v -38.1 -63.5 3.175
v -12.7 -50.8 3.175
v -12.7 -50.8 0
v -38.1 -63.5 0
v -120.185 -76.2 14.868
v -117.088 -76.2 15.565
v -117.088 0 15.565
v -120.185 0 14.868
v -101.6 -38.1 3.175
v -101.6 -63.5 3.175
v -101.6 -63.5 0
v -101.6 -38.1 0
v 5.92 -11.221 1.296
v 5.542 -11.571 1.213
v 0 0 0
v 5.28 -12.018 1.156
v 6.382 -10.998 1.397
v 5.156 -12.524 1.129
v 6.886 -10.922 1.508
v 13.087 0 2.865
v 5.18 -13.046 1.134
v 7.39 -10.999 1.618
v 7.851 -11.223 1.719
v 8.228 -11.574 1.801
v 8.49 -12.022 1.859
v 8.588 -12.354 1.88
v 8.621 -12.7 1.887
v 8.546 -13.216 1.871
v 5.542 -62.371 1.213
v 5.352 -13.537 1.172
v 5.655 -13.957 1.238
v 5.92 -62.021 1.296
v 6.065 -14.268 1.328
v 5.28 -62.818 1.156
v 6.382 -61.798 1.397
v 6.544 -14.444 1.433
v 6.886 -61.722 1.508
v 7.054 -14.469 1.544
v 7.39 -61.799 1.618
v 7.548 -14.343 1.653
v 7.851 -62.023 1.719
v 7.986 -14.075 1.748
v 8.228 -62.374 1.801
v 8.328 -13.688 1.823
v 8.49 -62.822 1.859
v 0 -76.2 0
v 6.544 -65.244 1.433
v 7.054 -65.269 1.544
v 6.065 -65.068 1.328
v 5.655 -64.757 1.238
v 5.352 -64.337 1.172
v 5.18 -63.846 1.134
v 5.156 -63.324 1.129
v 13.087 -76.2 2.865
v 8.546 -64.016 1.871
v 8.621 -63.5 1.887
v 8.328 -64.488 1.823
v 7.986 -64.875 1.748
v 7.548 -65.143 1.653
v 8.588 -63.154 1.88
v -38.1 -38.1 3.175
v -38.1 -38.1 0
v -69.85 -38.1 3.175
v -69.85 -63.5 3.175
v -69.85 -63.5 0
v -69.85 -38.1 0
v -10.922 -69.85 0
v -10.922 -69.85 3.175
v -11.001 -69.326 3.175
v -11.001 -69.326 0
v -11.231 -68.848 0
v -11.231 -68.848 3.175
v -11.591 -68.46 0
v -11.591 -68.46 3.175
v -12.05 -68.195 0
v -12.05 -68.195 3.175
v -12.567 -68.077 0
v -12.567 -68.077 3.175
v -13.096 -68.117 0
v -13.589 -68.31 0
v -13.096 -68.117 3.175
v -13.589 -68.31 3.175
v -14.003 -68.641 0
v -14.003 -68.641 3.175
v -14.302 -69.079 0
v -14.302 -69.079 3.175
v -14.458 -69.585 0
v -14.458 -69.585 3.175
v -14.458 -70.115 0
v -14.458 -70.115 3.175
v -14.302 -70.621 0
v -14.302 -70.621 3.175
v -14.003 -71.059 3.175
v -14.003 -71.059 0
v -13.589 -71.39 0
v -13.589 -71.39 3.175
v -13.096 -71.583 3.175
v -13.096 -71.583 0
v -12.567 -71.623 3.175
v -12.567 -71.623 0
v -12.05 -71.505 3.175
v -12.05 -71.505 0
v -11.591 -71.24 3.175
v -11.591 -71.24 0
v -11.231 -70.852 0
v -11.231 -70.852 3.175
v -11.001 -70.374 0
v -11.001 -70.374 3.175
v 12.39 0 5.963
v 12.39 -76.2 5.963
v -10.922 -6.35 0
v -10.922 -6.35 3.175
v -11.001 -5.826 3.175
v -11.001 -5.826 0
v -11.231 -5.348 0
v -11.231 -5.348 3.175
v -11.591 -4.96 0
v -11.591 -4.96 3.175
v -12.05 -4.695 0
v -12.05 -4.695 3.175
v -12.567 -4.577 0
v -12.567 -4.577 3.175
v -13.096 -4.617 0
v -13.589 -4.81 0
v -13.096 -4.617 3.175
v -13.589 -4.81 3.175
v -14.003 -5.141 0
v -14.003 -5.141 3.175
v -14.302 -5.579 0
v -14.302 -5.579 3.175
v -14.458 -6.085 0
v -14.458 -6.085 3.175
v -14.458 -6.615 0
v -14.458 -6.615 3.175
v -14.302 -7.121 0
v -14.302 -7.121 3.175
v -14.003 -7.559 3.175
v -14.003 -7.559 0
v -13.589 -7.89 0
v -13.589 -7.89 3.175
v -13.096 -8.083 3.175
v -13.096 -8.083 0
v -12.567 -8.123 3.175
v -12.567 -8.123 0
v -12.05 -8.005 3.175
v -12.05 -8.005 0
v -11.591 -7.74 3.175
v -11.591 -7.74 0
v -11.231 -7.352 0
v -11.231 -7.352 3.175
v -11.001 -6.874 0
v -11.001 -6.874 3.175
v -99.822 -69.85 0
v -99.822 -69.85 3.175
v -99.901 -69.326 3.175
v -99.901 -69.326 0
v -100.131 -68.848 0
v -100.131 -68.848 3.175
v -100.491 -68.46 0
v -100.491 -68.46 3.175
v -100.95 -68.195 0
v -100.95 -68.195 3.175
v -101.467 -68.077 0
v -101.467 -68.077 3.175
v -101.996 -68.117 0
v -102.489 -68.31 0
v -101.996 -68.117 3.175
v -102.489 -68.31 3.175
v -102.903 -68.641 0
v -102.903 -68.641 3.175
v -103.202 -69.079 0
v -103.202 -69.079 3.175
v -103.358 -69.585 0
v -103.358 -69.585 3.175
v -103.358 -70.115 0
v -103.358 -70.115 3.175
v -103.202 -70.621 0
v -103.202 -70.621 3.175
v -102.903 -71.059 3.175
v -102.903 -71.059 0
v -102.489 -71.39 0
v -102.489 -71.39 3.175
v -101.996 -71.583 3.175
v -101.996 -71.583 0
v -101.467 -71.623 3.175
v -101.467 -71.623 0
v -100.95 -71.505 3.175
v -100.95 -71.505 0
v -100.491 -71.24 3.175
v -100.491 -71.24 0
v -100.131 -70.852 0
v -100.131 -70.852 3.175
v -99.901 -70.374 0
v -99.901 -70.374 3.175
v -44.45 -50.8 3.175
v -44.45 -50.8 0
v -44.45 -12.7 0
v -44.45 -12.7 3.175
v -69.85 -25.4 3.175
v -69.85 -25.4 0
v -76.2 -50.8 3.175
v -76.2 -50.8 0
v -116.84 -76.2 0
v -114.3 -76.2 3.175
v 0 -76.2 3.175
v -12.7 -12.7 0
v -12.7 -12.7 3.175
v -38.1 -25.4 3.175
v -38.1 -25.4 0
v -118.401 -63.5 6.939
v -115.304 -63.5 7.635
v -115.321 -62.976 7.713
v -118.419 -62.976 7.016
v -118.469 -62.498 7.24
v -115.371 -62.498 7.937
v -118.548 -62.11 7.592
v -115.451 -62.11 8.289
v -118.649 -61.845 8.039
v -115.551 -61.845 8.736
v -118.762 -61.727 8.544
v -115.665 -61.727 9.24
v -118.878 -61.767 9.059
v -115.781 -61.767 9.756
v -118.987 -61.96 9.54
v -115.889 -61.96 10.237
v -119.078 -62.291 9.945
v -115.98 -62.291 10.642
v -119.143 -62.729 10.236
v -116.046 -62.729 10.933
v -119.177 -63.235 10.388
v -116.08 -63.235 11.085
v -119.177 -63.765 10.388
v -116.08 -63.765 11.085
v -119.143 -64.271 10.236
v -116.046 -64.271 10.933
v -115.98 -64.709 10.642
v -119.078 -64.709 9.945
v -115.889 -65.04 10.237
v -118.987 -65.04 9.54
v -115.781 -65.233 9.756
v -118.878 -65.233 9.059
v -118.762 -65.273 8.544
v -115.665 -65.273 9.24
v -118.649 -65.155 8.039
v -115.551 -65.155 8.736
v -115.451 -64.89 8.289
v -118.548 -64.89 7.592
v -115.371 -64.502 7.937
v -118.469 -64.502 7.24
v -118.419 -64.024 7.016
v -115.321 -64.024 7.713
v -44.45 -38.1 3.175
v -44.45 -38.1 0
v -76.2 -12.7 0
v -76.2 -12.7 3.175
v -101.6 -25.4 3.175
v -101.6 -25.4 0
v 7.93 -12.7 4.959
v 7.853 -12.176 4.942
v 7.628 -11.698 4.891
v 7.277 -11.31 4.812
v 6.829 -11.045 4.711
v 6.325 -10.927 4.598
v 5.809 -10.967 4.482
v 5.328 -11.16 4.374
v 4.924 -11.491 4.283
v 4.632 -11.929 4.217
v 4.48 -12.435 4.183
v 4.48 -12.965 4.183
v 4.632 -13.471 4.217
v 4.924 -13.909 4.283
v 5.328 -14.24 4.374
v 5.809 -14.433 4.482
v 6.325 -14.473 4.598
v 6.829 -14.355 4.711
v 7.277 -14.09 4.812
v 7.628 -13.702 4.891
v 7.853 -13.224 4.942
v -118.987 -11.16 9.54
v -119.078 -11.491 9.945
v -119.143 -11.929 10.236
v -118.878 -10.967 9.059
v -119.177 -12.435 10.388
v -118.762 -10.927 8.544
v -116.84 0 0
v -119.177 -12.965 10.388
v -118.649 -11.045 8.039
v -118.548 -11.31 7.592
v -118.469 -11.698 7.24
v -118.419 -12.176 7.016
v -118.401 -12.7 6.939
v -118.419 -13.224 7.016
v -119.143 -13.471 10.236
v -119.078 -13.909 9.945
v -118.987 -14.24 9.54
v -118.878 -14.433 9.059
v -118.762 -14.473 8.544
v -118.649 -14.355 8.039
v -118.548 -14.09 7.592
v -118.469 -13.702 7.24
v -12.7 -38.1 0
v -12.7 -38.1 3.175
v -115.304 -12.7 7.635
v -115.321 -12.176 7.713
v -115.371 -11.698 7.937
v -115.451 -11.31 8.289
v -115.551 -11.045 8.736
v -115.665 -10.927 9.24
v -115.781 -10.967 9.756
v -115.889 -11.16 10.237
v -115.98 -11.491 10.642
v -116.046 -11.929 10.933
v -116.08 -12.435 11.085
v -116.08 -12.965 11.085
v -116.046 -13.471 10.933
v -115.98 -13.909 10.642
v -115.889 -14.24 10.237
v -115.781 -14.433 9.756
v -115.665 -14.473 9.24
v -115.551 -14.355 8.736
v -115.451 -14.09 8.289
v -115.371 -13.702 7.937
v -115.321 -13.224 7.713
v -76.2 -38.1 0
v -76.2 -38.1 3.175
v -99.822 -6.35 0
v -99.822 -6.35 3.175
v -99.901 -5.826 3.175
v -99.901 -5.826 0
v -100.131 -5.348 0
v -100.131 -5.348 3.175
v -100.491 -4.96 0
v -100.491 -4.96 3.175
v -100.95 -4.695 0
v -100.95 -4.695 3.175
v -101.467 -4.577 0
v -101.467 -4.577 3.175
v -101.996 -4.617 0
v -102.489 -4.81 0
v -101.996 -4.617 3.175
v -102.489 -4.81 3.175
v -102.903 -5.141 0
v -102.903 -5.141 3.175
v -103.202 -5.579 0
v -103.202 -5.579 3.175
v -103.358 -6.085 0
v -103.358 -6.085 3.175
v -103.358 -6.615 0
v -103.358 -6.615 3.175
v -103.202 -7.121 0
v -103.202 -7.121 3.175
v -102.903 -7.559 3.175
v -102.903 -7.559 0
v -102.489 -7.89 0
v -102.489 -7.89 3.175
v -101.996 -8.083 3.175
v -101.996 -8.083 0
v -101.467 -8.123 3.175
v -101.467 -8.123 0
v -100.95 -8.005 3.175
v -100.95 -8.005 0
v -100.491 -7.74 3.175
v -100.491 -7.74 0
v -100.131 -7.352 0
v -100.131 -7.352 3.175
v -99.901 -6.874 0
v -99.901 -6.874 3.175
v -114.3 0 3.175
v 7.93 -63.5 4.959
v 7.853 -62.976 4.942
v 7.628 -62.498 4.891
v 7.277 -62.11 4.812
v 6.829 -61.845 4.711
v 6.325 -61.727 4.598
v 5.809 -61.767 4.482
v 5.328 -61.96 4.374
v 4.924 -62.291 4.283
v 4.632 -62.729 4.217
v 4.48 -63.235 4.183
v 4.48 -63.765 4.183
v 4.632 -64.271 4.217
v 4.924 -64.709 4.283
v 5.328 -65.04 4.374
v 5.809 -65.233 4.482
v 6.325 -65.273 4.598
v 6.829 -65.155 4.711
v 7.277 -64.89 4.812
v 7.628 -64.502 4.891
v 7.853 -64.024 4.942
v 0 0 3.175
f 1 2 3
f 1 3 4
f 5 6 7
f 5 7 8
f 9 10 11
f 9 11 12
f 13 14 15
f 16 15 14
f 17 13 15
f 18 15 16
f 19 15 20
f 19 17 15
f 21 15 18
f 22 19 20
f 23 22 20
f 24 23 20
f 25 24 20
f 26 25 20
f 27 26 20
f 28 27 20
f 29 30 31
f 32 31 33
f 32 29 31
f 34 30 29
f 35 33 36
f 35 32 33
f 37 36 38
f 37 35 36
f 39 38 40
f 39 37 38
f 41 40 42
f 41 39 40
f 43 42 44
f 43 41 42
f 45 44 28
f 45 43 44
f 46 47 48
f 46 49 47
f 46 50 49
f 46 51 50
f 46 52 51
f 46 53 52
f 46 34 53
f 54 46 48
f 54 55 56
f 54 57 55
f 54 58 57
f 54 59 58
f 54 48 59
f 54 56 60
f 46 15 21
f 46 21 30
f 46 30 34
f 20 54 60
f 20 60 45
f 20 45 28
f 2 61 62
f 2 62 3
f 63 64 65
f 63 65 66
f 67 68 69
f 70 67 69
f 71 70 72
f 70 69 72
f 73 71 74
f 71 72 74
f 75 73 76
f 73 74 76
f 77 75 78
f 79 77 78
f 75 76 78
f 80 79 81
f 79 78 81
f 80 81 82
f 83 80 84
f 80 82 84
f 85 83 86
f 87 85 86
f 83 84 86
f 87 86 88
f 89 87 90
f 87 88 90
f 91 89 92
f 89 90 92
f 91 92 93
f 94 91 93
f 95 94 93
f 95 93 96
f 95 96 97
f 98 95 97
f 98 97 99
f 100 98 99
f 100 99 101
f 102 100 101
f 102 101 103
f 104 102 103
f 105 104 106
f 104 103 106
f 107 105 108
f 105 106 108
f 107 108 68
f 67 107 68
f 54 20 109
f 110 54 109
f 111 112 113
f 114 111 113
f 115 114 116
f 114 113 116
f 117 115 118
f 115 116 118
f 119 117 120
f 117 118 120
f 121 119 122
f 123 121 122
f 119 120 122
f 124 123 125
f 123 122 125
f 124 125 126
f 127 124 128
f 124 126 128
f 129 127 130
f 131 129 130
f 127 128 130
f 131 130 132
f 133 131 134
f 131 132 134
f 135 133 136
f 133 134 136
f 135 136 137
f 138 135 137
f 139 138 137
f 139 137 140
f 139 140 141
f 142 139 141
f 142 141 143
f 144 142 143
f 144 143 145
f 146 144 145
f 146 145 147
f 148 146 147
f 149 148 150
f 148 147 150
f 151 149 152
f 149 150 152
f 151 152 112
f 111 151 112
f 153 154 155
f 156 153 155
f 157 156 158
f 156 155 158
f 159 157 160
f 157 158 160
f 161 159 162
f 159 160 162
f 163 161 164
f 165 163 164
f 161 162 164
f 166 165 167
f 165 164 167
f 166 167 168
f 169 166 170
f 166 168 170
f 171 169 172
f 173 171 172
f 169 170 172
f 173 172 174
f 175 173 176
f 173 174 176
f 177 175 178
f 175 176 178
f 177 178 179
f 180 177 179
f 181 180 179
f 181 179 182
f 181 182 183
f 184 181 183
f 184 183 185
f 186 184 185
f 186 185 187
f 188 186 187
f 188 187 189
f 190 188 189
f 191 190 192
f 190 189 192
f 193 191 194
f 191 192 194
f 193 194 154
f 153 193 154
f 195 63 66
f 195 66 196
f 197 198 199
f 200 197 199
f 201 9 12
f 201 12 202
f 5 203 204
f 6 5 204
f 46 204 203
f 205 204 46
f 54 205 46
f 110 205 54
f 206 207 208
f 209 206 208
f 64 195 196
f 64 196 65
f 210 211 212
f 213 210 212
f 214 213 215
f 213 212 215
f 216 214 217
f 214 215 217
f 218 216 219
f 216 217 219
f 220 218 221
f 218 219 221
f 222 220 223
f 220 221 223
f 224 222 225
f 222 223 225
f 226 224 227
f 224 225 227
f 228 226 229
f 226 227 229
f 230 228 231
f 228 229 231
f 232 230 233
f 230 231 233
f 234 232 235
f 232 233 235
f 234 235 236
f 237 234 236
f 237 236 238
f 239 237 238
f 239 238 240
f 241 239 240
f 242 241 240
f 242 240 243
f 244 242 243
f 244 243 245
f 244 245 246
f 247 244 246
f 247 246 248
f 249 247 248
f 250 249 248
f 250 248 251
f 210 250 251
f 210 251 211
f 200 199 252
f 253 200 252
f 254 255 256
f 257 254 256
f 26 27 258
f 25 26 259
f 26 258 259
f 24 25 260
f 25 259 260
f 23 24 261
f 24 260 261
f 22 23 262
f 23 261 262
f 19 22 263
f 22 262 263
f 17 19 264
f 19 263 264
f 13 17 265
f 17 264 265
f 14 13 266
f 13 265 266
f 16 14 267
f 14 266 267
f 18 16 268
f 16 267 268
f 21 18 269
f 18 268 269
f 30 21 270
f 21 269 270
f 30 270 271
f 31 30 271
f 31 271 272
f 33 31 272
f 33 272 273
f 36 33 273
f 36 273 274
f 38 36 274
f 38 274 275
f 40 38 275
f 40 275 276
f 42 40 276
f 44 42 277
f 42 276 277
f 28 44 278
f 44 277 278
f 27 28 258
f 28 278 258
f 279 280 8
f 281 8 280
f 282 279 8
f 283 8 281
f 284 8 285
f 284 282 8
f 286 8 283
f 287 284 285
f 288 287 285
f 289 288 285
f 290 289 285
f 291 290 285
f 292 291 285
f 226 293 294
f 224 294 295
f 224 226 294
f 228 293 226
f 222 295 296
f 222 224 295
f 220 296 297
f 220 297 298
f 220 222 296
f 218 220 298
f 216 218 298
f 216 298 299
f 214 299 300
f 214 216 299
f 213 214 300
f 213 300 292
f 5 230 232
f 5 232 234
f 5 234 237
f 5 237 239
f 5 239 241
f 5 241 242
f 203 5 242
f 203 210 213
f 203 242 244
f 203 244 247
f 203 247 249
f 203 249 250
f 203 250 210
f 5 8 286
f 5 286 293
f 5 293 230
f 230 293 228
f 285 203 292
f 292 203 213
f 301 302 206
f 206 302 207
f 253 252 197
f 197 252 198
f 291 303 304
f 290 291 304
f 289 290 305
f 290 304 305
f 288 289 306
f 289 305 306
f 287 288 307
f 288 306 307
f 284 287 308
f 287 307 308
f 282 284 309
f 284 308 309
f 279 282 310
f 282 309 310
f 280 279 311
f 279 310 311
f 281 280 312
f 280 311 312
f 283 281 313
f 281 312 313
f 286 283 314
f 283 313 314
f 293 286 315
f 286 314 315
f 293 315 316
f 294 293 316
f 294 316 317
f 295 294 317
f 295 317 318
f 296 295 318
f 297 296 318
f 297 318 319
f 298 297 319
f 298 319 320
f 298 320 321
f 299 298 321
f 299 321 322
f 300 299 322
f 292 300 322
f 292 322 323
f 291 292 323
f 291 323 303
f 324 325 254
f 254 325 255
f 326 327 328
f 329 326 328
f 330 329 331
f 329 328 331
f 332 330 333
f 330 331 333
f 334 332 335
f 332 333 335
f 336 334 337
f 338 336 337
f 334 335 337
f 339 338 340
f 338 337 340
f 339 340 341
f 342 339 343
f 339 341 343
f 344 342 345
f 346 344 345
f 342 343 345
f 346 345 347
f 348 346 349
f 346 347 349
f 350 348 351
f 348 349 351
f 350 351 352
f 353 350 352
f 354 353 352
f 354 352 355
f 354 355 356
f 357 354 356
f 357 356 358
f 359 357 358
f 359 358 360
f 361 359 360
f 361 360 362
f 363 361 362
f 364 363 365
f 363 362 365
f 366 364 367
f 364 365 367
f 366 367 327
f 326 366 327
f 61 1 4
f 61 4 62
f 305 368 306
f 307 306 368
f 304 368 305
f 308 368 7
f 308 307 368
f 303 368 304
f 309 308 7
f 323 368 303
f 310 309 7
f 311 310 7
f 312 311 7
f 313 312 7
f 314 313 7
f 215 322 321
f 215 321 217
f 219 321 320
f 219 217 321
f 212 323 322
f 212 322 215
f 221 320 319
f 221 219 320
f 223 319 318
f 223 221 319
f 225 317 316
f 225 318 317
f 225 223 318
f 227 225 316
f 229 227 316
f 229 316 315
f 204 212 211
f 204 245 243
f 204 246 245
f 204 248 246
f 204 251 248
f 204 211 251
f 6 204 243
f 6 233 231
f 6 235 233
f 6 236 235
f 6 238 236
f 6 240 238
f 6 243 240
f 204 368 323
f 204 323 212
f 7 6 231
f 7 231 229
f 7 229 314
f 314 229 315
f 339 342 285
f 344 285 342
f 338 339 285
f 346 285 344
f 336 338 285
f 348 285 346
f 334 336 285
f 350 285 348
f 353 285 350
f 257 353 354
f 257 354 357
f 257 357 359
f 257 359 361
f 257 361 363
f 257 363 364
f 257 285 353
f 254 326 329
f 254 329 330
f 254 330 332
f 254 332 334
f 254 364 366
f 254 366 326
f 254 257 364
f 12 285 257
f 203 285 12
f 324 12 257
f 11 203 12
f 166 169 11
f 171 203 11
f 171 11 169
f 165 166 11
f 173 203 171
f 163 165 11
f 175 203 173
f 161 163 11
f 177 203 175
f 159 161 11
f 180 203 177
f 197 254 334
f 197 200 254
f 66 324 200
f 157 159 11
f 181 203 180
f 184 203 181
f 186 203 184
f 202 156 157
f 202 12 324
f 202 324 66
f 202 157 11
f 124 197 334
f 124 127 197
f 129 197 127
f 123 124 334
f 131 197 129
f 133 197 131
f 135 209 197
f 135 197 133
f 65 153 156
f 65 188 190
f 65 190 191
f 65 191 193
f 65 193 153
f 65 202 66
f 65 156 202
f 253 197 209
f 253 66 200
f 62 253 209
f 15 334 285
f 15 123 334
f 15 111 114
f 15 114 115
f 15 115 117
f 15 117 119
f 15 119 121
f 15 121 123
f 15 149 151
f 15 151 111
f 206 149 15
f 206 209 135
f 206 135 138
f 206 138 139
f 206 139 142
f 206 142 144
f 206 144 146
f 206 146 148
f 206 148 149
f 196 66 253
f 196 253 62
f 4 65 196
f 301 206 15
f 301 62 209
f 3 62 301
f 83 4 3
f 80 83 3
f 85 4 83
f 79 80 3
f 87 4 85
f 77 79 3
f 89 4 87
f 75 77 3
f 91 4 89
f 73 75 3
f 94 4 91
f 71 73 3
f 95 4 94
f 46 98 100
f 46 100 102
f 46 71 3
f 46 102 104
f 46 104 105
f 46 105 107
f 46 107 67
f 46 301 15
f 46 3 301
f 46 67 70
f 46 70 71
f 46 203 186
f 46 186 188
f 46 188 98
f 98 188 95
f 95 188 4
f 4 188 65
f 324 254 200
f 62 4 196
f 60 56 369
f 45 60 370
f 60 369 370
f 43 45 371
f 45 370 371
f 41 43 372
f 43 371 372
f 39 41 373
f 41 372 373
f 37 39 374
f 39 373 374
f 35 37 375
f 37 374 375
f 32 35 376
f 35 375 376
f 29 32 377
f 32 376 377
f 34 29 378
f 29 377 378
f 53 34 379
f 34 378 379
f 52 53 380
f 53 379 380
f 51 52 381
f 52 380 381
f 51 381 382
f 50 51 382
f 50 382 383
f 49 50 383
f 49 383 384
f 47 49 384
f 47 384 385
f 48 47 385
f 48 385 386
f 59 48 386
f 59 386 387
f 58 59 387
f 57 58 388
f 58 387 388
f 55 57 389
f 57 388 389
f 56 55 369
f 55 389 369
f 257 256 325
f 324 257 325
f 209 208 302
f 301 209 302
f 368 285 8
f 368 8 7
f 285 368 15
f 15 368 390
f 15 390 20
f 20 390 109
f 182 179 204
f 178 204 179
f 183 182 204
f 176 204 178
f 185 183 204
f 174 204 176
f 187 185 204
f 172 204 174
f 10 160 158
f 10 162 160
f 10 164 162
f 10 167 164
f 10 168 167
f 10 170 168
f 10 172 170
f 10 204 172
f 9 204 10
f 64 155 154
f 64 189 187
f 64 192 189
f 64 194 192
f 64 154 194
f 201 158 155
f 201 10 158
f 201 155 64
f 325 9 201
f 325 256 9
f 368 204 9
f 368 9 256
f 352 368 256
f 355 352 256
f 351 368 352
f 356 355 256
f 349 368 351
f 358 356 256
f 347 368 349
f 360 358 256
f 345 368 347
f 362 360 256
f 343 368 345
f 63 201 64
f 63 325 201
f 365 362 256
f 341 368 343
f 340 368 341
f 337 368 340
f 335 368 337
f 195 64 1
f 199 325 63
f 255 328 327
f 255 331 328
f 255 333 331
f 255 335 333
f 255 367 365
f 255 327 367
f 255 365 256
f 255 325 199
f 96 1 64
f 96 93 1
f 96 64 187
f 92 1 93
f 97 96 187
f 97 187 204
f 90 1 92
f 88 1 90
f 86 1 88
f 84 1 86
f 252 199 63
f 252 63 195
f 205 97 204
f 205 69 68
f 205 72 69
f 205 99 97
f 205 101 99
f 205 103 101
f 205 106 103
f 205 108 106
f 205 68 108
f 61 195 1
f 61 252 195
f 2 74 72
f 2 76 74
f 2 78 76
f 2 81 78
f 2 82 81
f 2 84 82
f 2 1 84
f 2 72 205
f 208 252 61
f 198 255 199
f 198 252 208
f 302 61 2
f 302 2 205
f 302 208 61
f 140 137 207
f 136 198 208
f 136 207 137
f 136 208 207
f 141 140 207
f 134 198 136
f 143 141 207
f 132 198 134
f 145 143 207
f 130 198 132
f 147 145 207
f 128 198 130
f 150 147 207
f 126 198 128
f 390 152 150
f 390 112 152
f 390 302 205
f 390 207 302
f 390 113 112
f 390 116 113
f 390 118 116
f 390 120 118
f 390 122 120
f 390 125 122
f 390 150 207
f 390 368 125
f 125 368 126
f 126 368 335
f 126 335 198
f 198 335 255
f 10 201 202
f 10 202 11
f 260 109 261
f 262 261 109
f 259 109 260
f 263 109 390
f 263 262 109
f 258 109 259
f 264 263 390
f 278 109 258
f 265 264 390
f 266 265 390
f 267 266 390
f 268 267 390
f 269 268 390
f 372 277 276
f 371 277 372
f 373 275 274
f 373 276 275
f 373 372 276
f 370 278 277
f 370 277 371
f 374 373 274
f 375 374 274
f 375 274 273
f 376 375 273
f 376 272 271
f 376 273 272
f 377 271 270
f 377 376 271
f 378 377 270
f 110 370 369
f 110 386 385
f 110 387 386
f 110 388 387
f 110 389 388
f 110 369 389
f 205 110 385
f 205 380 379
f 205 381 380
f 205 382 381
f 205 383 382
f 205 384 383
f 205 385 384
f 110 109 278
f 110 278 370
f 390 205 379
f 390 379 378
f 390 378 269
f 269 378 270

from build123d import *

# Parameters (mm, degrees)
SKETCH1_W           = 114.3
SKETCH1_H           = 76.2
BOSS_EXTRUDE1_DEPTH = 3.175
BOSS_EXTRUDE2_DEPTH = 76.2
SKETCH3_R           = 1.778
CUT_EXTRUDE1_DEPTH  = 203.2
CUT_EXTRUDE2_DEPTH  = 3.175
LPATTERN1_COUNT     = 3
LPATTERN1_PITCH     = 31.75
SKETCH5_R           = 1.778
CUT_EXTRUDE3_DEPTH  = 3.175
SKETCH6_R           = 1.778
CUT_EXTRUDE4_DEPTH  = 3.175


with BuildPart() as part:
    # Sketch1 → Boss-Extrude1 (new body)
    with BuildSketch(Plane.XY):
        with Locations((-57.15, -38.1)):
            Rectangle(SKETCH1_W, SKETCH1_H)
    extrude(amount=BOSS_EXTRUDE1_DEPTH)

    # Sketch2 → Boss-Extrude2 (add)
    with BuildSketch(Plane.XZ.offset(76.2)):
        Polygon((-114.3, 3.175), (-117.087804878, 15.565243902), (-120.185365854, 14.868292683), (-116.84, 0), (-114.3, 0), align=None)
        Polygon((0, 3.175), (0, 0), (13.087195122, 2.865243902), (12.390243902, 5.962804878), align=None)
    extrude(amount=-BOSS_EXTRUDE2_DEPTH)

    # Sketch3 → Cut-Extrude1 (cut)
    with BuildSketch(Plane(origin=(-108.112433076, 0, -24.325297442), x_dir=(0.219512195, 0, -0.975609756), z_dir=(0.975609756, 0, 0.219512195))):
        with Locations((-34.537804878, -12.7)):
            Circle(SKETCH3_R)
        with Locations((-34.537804878, -63.5)):
            Circle(SKETCH3_R)
    extrude(amount=-CUT_EXTRUDE1_DEPTH, mode=Mode.SUBTRACT)

    # Sketch4 → Cut-Extrude2 (cut)
    with BuildSketch(Plane.XY.offset(3.175)):
        Polygon((-101.6, -63.5), (-101.6, -38.1), (-76.2, -50.8), align=None)
        Polygon((-101.6, -25.4), (-76.2, -38.1), (-76.2, -12.7), align=None)
    cut_extrude2 = extrude(amount=-CUT_EXTRUDE2_DEPTH, mode=Mode.SUBTRACT)

    # LPattern1: Cut-Extrude2 ×3
    with Locations(*[(i * LPATTERN1_PITCH, 0, 0) for i in range(1, LPATTERN1_COUNT)]):
        add(cut_extrude2, mode=Mode.SUBTRACT)

    # Sketch5 → Cut-Extrude3 (cut)
    with BuildSketch(Plane.XY.offset(3.175)):
        with Locations((-101.6, -69.85)):
            Circle(SKETCH5_R)
        with Locations((-12.7, -69.85)):
            Circle(SKETCH5_R)
        with Locations((-12.7, -6.35)):
            Circle(SKETCH5_R)
        with Locations((-101.6, -6.35)):
            Circle(SKETCH5_R)
    extrude(amount=-CUT_EXTRUDE3_DEPTH, mode=Mode.SUBTRACT)

    # Sketch6 → Cut-Extrude4 (cut)
    with BuildSketch(Plane(origin=(-0.679952409, 0, 3.022010708), x_dir=(0.975609756, 0, 0.219512195), z_dir=(-0.219512195, 0, 0.975609756))):
        with Locations((7.04695122, -63.5)):
            Circle(SKETCH6_R)
        with Locations((7.04695122, -12.7)):
            Circle(SKETCH6_R)
    extrude(amount=-CUT_EXTRUDE4_DEPTH, mode=Mode.SUBTRACT)


solid = part.part
